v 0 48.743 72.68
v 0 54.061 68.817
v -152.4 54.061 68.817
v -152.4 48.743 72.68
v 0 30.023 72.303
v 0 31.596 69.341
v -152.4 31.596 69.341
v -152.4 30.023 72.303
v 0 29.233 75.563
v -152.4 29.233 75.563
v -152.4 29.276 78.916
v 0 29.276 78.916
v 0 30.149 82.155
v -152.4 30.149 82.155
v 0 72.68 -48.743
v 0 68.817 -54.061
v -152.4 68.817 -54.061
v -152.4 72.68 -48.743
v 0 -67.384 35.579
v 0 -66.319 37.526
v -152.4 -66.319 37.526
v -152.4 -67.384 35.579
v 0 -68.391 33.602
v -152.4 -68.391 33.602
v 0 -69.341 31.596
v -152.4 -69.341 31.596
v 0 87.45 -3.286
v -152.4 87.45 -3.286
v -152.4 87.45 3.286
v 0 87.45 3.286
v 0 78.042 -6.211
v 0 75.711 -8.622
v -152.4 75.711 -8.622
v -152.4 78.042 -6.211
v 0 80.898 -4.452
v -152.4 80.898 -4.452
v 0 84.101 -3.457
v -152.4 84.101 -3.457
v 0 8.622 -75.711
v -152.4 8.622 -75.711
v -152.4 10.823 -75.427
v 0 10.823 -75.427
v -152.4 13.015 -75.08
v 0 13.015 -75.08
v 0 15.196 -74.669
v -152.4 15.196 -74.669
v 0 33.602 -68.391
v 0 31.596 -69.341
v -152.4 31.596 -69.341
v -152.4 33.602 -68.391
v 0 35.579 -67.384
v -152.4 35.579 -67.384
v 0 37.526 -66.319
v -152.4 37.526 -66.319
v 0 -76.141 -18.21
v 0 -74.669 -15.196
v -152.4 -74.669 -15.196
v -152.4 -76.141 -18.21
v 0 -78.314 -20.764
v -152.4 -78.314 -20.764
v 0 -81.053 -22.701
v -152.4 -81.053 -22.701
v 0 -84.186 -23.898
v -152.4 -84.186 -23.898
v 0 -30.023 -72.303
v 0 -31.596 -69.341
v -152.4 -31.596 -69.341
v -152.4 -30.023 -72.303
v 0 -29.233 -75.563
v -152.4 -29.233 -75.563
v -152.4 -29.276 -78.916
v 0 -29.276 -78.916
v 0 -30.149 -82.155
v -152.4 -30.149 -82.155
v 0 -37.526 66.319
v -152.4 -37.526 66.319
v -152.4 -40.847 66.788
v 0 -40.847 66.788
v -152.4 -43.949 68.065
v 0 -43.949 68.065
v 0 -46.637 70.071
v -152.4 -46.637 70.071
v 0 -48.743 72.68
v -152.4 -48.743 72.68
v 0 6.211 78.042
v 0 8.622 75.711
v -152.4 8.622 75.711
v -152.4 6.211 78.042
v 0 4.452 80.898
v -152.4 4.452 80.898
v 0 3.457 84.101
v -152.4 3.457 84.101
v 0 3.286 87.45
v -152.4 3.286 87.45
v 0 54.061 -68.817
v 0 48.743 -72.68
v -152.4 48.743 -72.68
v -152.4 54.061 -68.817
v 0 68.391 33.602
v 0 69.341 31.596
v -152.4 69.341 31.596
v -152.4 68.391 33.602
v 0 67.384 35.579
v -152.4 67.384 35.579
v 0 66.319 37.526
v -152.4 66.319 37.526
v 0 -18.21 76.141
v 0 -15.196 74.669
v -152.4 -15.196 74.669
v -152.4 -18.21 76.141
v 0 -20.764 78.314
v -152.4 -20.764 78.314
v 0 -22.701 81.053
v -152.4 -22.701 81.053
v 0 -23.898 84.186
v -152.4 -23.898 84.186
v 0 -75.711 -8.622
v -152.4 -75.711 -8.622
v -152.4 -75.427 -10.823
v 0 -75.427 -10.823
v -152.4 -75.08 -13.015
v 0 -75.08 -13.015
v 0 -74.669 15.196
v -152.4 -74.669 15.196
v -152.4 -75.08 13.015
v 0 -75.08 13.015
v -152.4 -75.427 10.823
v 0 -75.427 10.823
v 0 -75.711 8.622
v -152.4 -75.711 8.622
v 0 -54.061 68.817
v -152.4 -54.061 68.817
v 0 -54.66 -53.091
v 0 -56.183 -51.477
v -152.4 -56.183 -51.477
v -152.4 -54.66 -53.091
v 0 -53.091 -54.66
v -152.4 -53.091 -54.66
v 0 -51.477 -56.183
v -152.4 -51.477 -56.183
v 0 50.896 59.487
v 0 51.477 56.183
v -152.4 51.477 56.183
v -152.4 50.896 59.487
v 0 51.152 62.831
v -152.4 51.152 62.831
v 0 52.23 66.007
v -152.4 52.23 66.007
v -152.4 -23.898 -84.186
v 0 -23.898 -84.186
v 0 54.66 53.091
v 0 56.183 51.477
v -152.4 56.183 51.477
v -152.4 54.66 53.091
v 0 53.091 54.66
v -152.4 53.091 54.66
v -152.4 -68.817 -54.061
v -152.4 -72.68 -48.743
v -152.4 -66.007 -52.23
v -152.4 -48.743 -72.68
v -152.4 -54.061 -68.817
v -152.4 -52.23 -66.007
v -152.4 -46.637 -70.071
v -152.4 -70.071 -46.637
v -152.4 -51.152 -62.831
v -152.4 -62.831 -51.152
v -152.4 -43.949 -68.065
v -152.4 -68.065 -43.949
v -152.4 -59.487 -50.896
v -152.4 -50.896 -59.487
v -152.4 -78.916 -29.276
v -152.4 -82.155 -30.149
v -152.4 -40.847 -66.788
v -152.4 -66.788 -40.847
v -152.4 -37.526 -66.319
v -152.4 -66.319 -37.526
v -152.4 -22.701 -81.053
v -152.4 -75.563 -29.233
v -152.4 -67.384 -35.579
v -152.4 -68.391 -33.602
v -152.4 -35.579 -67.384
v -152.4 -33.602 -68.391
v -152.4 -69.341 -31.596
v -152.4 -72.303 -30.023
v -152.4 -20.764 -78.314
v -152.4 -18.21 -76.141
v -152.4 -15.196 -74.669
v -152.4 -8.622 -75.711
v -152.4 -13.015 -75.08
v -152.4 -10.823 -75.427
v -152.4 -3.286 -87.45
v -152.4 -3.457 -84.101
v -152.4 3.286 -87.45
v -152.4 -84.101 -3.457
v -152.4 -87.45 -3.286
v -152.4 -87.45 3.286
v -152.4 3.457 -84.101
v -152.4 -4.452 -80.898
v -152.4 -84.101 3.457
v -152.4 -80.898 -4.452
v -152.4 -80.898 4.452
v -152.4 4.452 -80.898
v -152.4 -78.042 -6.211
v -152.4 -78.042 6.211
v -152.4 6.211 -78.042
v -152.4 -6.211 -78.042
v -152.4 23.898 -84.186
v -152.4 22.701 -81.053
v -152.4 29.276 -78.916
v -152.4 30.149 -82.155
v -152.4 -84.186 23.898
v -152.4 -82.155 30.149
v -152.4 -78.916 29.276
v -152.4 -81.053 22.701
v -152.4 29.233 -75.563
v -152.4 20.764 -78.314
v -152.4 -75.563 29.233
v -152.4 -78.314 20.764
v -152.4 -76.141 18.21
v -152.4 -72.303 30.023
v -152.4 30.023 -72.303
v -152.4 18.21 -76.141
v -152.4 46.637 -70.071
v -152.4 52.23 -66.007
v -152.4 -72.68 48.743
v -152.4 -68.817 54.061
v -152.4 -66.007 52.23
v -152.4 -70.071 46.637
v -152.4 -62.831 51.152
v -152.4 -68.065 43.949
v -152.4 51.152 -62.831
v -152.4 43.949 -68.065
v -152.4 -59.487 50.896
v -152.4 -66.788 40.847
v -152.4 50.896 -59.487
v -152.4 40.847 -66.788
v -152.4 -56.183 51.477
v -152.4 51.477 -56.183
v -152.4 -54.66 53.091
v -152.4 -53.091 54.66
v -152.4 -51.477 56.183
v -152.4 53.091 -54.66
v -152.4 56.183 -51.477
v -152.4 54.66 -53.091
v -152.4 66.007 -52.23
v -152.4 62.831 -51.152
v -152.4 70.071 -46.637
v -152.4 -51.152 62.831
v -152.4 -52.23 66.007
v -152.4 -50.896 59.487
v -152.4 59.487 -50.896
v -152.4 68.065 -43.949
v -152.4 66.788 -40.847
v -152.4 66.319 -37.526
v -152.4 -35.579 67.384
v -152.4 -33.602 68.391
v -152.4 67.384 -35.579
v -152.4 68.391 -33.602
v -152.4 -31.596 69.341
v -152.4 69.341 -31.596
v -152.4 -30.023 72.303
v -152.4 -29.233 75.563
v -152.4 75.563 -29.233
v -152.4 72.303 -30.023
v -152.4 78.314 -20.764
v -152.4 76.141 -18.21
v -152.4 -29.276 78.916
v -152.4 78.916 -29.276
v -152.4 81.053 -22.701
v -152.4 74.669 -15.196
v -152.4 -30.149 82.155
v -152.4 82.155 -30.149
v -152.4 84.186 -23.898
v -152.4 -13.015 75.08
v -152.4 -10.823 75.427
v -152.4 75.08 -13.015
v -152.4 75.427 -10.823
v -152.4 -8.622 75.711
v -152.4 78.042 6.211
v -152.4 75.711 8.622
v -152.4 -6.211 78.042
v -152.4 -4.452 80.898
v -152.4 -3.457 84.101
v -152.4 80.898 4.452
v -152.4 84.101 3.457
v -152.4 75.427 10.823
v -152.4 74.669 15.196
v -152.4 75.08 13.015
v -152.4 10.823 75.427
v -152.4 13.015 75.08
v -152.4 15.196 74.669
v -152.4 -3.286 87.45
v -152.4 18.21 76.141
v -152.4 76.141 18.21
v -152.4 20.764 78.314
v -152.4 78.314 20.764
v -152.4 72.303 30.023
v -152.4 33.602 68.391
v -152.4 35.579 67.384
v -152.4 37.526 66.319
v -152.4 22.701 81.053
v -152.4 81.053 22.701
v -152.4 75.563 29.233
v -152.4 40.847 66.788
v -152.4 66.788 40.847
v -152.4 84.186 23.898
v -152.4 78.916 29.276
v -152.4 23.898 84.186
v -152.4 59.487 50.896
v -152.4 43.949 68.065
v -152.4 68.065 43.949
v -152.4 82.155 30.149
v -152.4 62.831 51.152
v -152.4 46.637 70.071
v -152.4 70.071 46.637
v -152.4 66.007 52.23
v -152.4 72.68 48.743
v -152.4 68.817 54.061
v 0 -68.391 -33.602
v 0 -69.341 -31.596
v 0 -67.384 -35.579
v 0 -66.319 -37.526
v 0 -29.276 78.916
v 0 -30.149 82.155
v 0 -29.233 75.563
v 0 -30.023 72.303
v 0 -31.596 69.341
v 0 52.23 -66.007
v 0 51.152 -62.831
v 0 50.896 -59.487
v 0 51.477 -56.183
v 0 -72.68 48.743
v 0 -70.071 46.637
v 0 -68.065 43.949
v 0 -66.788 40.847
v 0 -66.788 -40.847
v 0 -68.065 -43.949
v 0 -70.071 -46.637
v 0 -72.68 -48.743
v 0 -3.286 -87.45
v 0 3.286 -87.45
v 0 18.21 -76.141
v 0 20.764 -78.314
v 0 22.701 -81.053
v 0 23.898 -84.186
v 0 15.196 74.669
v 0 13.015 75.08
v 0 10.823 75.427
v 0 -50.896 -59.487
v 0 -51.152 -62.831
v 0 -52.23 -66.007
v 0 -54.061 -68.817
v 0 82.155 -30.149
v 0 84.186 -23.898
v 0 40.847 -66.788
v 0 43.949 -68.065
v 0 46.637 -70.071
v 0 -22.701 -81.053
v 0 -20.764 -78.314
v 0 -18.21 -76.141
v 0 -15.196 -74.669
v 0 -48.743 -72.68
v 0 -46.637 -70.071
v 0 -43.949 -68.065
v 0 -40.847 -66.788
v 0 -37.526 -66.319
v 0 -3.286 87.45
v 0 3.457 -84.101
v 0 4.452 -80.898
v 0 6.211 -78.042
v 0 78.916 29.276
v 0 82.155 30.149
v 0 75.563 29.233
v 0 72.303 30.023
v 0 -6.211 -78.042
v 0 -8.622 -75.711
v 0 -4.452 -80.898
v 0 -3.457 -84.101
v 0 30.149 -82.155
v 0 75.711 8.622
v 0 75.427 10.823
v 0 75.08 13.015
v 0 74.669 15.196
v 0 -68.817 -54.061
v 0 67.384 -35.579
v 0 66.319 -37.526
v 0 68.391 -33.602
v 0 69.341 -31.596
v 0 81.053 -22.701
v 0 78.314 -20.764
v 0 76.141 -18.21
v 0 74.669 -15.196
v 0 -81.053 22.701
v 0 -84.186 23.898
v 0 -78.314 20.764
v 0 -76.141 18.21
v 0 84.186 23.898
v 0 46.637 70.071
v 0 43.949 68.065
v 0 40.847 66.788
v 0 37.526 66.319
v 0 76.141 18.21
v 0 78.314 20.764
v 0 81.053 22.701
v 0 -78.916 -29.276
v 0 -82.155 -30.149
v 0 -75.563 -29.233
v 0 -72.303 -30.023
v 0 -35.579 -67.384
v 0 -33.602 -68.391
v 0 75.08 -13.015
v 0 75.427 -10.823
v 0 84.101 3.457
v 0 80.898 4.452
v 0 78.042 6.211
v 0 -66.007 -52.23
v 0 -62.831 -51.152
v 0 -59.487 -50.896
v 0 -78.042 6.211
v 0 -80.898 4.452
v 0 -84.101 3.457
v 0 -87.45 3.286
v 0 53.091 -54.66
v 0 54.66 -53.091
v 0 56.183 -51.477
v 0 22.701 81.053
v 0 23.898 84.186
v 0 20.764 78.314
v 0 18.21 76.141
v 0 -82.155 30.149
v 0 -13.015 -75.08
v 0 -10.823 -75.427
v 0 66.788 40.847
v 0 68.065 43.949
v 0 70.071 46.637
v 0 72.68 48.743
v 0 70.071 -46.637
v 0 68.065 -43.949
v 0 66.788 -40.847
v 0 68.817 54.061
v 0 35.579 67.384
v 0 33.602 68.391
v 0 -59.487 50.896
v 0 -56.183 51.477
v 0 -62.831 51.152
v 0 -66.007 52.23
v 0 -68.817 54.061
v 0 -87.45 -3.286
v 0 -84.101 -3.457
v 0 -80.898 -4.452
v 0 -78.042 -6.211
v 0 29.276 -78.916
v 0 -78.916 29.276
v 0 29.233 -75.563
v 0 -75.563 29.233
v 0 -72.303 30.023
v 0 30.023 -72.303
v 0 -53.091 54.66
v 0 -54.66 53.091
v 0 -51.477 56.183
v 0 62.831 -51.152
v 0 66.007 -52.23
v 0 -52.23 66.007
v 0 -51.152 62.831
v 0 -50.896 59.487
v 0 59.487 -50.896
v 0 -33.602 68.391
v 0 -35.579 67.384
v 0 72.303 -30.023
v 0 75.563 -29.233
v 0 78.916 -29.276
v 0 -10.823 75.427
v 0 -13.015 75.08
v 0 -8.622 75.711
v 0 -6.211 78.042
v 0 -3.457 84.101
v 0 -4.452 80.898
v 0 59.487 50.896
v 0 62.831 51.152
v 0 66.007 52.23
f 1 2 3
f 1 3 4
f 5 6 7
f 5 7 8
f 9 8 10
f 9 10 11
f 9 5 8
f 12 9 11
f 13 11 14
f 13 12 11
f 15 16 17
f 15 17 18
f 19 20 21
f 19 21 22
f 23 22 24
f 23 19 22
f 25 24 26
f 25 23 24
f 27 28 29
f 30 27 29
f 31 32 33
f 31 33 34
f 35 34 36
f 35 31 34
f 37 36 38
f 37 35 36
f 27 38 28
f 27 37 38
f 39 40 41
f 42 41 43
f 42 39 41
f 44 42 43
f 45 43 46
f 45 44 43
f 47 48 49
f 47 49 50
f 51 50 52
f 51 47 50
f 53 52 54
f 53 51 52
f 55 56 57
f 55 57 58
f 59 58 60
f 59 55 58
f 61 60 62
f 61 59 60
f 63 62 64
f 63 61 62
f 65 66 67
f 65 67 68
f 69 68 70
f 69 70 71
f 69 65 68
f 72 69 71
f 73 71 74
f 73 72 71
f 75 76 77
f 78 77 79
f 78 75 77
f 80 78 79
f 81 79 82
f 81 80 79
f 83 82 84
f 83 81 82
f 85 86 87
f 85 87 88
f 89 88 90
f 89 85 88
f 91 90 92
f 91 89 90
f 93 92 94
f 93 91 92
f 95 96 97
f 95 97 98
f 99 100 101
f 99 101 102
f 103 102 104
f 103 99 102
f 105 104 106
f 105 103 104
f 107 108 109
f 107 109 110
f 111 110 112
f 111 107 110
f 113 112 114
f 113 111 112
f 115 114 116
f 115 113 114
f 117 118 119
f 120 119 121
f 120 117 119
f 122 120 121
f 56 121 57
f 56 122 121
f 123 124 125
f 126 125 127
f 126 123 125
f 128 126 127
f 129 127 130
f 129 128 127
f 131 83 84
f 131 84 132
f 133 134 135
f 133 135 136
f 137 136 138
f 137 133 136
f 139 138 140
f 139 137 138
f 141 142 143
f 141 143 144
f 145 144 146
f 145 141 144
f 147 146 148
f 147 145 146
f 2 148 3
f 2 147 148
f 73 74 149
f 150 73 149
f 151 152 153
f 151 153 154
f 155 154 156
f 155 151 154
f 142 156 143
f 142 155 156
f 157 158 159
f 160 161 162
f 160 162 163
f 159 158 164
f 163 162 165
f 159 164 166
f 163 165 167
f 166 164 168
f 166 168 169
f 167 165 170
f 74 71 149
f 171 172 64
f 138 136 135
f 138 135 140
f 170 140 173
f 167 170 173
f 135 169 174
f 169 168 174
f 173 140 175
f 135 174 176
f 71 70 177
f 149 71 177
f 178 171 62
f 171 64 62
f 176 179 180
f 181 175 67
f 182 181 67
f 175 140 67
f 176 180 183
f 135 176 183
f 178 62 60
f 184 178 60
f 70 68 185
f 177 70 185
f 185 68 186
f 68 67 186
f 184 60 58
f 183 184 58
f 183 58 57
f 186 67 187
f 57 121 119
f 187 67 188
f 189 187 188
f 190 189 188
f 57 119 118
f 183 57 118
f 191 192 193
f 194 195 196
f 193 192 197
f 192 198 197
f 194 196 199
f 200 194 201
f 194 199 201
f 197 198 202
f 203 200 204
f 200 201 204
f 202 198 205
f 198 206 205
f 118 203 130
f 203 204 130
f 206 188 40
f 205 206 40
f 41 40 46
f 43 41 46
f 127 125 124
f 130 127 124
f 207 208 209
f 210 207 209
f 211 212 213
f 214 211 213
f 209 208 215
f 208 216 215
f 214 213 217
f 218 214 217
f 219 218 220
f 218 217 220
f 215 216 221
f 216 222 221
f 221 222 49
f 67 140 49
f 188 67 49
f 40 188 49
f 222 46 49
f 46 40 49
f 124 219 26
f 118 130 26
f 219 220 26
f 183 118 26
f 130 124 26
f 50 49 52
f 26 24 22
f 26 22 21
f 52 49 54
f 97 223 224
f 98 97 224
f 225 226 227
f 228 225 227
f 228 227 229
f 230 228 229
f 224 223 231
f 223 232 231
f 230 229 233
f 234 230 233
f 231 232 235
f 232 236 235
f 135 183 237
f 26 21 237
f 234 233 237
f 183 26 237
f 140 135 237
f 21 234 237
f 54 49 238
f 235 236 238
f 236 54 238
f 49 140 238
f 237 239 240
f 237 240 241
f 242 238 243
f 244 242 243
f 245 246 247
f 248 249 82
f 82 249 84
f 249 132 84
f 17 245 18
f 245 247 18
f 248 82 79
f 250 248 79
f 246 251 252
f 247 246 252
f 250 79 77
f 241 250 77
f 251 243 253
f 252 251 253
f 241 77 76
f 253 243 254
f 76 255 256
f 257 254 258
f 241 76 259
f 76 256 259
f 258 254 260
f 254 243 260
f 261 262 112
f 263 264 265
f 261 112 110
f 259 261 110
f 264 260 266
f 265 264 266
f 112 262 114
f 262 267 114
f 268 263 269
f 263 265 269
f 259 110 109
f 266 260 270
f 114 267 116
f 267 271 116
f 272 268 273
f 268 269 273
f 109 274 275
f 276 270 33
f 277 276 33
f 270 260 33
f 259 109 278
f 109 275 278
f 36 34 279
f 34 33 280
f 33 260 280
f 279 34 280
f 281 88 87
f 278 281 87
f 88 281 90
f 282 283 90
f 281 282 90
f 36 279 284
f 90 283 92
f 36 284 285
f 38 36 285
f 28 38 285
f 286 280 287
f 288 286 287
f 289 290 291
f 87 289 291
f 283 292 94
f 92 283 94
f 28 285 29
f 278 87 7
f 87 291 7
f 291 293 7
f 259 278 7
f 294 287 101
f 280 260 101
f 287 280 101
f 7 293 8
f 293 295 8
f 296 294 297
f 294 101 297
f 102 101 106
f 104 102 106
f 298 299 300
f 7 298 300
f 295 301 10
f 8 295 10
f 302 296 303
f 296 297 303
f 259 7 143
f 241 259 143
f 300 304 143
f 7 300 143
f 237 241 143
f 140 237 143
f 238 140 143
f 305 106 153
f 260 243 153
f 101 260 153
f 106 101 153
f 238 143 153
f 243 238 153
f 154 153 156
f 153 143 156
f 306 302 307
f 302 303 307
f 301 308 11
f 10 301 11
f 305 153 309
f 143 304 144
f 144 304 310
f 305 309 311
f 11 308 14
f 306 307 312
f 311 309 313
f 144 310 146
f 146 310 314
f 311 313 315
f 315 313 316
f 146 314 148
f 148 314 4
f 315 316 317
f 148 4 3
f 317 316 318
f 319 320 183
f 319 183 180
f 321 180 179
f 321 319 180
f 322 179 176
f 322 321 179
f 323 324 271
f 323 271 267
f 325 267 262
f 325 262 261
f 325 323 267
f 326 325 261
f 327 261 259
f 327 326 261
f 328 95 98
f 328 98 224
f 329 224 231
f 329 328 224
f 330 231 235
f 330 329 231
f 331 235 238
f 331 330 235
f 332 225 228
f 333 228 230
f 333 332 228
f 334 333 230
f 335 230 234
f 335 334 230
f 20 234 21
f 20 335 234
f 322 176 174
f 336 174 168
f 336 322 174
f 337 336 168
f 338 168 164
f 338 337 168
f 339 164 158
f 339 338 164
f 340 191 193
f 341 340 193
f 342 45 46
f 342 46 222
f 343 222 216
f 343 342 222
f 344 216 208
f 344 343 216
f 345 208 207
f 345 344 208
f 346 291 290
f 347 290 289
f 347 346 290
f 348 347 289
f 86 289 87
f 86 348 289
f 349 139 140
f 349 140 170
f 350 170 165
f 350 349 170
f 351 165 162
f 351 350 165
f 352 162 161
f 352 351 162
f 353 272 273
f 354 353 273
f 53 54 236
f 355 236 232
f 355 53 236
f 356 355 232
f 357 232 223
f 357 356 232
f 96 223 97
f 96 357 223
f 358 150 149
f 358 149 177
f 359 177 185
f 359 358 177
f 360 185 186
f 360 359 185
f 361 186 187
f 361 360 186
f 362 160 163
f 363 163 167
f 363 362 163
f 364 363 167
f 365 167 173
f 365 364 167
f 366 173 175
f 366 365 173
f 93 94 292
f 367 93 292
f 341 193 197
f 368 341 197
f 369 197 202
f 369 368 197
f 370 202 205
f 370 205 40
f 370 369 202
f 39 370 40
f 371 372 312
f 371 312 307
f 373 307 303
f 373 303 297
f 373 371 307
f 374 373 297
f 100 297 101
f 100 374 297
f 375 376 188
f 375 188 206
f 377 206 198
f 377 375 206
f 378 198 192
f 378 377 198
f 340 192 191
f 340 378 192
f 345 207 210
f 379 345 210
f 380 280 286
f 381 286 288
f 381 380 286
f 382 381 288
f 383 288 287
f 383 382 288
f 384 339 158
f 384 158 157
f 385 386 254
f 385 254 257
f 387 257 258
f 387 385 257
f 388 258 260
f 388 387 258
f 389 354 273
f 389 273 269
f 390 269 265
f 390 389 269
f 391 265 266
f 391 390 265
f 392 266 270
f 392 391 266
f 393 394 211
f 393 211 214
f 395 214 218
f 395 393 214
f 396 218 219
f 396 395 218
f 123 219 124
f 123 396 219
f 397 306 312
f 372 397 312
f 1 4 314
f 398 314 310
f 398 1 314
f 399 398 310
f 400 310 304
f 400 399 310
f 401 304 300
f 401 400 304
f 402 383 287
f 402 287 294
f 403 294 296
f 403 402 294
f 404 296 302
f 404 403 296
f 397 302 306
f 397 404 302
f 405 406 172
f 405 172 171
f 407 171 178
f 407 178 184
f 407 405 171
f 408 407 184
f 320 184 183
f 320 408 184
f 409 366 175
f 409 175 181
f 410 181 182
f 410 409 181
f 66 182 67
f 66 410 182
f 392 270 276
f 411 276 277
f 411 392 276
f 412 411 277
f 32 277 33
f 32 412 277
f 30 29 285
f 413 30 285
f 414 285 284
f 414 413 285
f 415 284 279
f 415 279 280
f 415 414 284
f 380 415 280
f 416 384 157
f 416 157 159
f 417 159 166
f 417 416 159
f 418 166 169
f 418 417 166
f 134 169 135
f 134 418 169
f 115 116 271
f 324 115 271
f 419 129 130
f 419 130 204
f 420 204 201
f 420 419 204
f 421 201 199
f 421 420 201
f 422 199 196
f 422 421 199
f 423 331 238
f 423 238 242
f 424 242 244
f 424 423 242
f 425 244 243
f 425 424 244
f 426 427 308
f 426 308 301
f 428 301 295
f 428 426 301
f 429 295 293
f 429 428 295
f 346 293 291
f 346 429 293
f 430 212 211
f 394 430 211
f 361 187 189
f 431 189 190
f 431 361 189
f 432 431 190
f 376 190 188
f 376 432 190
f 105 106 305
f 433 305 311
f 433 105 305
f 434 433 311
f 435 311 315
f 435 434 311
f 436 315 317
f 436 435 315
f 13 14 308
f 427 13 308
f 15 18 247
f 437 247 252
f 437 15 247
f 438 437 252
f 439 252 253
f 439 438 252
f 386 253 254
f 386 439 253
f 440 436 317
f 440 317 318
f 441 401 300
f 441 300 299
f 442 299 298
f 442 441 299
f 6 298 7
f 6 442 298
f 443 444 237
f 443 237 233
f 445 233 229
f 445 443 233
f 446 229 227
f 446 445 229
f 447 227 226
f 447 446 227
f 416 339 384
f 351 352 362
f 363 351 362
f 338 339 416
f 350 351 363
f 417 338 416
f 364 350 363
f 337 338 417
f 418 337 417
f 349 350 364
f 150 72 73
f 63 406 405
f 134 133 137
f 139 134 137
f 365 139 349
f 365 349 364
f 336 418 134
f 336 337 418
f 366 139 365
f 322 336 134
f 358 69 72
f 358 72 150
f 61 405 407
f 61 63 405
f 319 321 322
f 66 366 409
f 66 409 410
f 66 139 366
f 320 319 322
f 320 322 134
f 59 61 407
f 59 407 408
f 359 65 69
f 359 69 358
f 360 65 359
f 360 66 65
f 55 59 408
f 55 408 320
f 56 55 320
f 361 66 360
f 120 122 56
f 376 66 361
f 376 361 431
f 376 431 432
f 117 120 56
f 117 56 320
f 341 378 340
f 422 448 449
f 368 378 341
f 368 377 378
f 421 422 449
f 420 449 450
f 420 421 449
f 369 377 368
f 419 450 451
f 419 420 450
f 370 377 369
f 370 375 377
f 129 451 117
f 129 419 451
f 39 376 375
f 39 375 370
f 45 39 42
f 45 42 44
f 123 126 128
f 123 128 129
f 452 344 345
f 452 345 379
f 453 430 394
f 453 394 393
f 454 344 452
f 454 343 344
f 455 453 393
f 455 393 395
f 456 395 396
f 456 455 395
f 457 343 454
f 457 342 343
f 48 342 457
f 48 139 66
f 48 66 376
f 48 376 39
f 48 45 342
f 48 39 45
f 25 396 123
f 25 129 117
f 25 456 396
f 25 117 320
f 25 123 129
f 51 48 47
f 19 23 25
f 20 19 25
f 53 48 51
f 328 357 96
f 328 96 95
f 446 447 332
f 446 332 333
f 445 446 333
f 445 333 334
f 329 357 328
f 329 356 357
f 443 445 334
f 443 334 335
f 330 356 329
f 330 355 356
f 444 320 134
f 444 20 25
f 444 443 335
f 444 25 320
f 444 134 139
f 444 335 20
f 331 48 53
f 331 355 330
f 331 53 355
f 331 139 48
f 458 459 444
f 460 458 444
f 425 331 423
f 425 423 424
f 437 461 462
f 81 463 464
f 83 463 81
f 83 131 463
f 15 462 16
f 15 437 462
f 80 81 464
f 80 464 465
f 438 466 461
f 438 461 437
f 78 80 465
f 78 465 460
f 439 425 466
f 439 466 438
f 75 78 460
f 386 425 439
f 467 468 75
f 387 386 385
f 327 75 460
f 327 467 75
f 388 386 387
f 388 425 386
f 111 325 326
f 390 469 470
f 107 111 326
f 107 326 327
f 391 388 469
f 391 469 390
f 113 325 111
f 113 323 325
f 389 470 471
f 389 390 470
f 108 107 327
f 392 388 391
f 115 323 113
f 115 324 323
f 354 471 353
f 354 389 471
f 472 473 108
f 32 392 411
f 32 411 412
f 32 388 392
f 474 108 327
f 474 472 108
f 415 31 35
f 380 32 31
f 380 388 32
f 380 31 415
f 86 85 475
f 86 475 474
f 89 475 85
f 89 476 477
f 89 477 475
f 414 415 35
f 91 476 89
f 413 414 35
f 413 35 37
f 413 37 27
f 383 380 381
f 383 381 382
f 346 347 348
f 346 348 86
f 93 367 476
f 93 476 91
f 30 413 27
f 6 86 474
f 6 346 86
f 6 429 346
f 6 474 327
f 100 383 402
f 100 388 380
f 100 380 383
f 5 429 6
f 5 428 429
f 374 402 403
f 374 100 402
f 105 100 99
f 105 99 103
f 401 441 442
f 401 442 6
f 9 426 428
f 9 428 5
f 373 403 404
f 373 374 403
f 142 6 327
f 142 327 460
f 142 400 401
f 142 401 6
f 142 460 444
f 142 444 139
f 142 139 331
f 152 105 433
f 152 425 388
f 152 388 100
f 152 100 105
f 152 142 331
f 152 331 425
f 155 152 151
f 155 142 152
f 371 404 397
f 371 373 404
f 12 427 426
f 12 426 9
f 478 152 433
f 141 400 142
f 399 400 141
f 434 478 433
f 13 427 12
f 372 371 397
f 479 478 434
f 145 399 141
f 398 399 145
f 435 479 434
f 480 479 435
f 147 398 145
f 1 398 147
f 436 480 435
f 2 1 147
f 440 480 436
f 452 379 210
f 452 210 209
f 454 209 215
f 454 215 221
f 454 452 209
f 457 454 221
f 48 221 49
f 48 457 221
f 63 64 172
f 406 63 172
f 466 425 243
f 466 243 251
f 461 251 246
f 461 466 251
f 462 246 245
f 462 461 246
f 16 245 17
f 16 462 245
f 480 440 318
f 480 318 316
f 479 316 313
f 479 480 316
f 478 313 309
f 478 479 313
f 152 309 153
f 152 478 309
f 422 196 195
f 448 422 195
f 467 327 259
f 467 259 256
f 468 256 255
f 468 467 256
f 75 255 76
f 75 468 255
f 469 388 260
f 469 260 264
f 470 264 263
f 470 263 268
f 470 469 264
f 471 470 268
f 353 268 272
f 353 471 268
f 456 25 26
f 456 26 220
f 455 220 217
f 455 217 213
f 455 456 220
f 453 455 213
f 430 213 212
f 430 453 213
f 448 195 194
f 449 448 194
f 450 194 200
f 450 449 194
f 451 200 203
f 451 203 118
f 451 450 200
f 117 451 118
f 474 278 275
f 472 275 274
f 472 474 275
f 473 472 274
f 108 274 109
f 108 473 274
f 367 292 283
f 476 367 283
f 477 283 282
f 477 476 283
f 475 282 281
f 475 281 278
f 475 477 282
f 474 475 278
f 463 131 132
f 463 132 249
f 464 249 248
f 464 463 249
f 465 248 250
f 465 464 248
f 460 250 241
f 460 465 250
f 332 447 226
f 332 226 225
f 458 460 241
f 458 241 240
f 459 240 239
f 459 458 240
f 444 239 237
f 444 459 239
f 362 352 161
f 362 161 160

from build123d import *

# Parameters (mm, degrees)
F0_DEPTH = 152.4


with BuildPart() as f0:
    # F1 (on Right) → F0 (new body)
    with BuildSketch(Plane.YZ):
        with BuildLine():
            ThreePointArc((75.710623, -8.622155), (76.077557, -4.318016), (76.2, 0))
            ThreePointArc((76.2, 0), (76.077557, 4.318016), (75.710623, 8.622155))
            ThreePointArc((75.710623, 8.622155), (75.261852, 11.920306), (74.669474, 15.195713))
            ThreePointArc((74.669474, 15.195713), (72.470507, 23.547095), (69.340689, 31.596025))
            ThreePointArc((69.340689, 31.596025), (67.894697, 34.594076), (66.319156, 37.526118))
            ThreePointArc((66.319156, 37.526118), (61.647095, 44.789236), (56.183205, 51.477057))
            ThreePointArc((56.183205, 51.477057), (53.881537, 53.881537), (51.477057, 56.183205))
            ThreePointArc((51.477057, 56.183205), (44.789236, 61.647095), (37.526118, 66.319156))
            ThreePointArc((37.526118, 66.319156), (34.594076, 67.894697), (31.596025, 69.340689))
            ThreePointArc((31.596025, 69.340689), (23.547095, 72.470507), (15.195713, 74.669474))
            ThreePointArc((15.195713, 74.669474), (11.920306, 75.261852), (8.622155, 75.710623))
            ThreePointArc((8.622155, 75.710623), (0, 76.2), (-8.622155, 75.710623))
            ThreePointArc((-8.622155, 75.710623), (-11.920306, 75.261852), (-15.195713, 74.669474))
            ThreePointArc((-15.195713, 74.669474), (-23.547095, 72.470507), (-31.596025, 69.340689))
            ThreePointArc((-31.596025, 69.340689), (-34.594076, 67.894697), (-37.526118, 66.319156))
            ThreePointArc((-37.526118, 66.319156), (-44.789236, 61.647095), (-51.477057, 56.183205))
            ThreePointArc((-51.477057, 56.183205), (-53.881537, 53.881537), (-56.183205, 51.477057))
            ThreePointArc((-56.183205, 51.477057), (-61.647095, 44.789236), (-66.319156, 37.526118))
            ThreePointArc((-66.319156, 37.526118), (-67.894697, 34.594076), (-69.340689, 31.596025))
            ThreePointArc((-69.340689, 31.596025), (-72.470507, 23.547095), (-74.669474, 15.195713))
            ThreePointArc((-74.669474, 15.195713), (-75.261852, 11.920306), (-75.710623, 8.622155))
            ThreePointArc((-75.710623, 8.622155), (-76.2, 0), (-75.710623, -8.622155))
            ThreePointArc((-75.710623, -8.622155), (-75.261852, -11.920306), (-74.669474, -15.195713))
            ThreePointArc((-74.669474, -15.195713), (-72.470507, -23.547095), (-69.340689, -31.596025))
            ThreePointArc((-69.340689, -31.596025), (-67.894697, -34.594076), (-66.319156, -37.526118))
            ThreePointArc((-66.319156, -37.526118), (-61.647095, -44.789236), (-56.183205, -51.477057))
            ThreePointArc((-56.183205, -51.477057), (-53.881537, -53.881537), (-51.477057, -56.183205))
            ThreePointArc((-51.477057, -56.183205), (-44.789236, -61.647095), (-37.526118, -66.319156))
            ThreePointArc((-37.526118, -66.319156), (-34.594076, -67.894697), (-31.596025, -69.340689))
            ThreePointArc((-31.596025, -69.340689), (-23.547095, -72.470507), (-15.195713, -74.669474))
            ThreePointArc((-15.195713, -74.669474), (-11.920306, -75.261852), (-8.622155, -75.710623))
            ThreePointArc((-8.622155, -75.710623), (0, -76.2), (8.622155, -75.710623))
            ThreePointArc((8.622155, -75.710623), (11.920306, -75.261852), (15.195713, -74.669474))
            ThreePointArc((15.195713, -74.669474), (23.547095, -72.470507), (31.596025, -69.340689))
            ThreePointArc((31.596025, -69.340689), (34.594076, -67.894697), (37.526118, -66.319156))
            ThreePointArc((37.526118, -66.319156), (44.789236, -61.647095), (51.477057, -56.183205))
            ThreePointArc((51.477057, -56.183205), (53.881537, -53.881537), (56.183205, -51.477057))
            ThreePointArc((56.183205, -51.477057), (61.647095, -44.789236), (66.319156, -37.526118))
            ThreePointArc((66.319156, -37.526118), (67.894697, -34.594076), (69.340689, -31.596025))
            ThreePointArc((69.340689, -31.596025), (72.470507, -23.547095), (74.669474, -15.195713))
            ThreePointArc((74.669474, -15.195713), (75.261852, -11.920306), (75.710623, -8.622155))
        make_face()
        with BuildLine():
            ThreePointArc((-31.596025, 69.340689), (-23.547095, 72.470507), (-15.195713, 74.669474))
            ThreePointArc((-15.195713, 74.669474), (-20.764473, 78.314179), (-23.898246, 84.185671))
            Line((-23.898246, 84.185671), (-30.149009, 82.154676))
            ThreePointArc((-30.149009, 82.154676), (-29.233108, 75.562553), (-31.596025, 69.340689))
        make_face()
        with BuildLine():
            ThreePointArc((-51.477057, 56.183205), (-44.789236, 61.647095), (-37.526118, 66.319156))
            ThreePointArc((-37.526118, 66.319156), (-43.948599, 68.064635), (-48.743386, 72.680367))
            Line((-48.743386, 72.680367), (-54.060602, 68.817184))
            ThreePointArc((-54.060602, 68.817184), (-51.152451, 62.830731), (-51.477057, 56.183205))
        make_face()
        with BuildLine():
            ThreePointArc((-66.319156, 37.526118), (-61.647095, 44.789236), (-56.183205, 51.477057))
            ThreePointArc((-56.183205, 51.477057), (-62.830731, 51.152451), (-68.817184, 54.060602))
            Line((-68.817184, 54.060602), (-72.680367, 48.743386))
            ThreePointArc((-72.680367, 48.743386), (-68.064635, 43.948599), (-66.319156, 37.526118))
        make_face()
        with BuildLine():
            ThreePointArc((-74.669474, 15.195713), (-72.470507, 23.547095), (-69.340689, 31.596025))
            ThreePointArc((-69.340689, 31.596025), (-75.562553, 29.233108), (-82.154676, 30.149009))
            Line((-82.154676, 30.149009), (-84.185671, 23.898246))
            ThreePointArc((-84.185671, 23.898246), (-78.314179, 20.764473), (-74.669474, 15.195713))
        make_face()
        with BuildLine():
            ThreePointArc((-75.710623, -8.622155), (-76.2, 0), (-75.710623, 8.622155))
            ThreePointArc((-75.710623, 8.622155), (-80.897785, 4.452225), (-87.450296, 3.28622))
            Line((-87.450296, 3.28622), (-87.450296, -3.28622))
            ThreePointArc((-87.450296, -3.28622), (-80.897785, -4.452225), (-75.710623, -8.622155))
        make_face()
        with BuildLine():
            ThreePointArc((-82.154676, -30.149009), (-75.562553, -29.233108), (-69.340689, -31.596025))
            ThreePointArc((-69.340689, -31.596025), (-72.470507, -23.547095), (-74.669474, -15.195713))
            ThreePointArc((-74.669474, -15.195713), (-78.314179, -20.764473), (-84.185671, -23.898246))
            Line((-84.185671, -23.898246), (-82.154676, -30.149009))
        make_face()
        with BuildLine():
            ThreePointArc((-68.817184, -54.060602), (-62.830731, -51.152451), (-56.183205, -51.477057))
            ThreePointArc((-56.183205, -51.477057), (-61.647095, -44.789236), (-66.319156, -37.526118))
            ThreePointArc((-66.319156, -37.526118), (-68.064635, -43.948599), (-72.680367, -48.743386))
            Line((-72.680367, -48.743386), (-68.817184, -54.060602))
        make_face()
        with BuildLine():
            ThreePointArc((-48.743386, -72.680367), (-43.948599, -68.064635), (-37.526118, -66.319156))
            ThreePointArc((-37.526118, -66.319156), (-44.789236, -61.647095), (-51.477057, -56.183205))
            ThreePointArc((-51.477057, -56.183205), (-51.152451, -62.830731), (-54.060602, -68.817184))
            Line((-54.060602, -68.817184), (-48.743386, -72.680367))
        make_face()
        with BuildLine():
            ThreePointArc((-23.898246, -84.185671), (-20.764473, -78.314179), (-15.195713, -74.669474))
            ThreePointArc((-15.195713, -74.669474), (-23.547095, -72.470507), (-31.596025, -69.340689))
            ThreePointArc((-31.596025, -69.340689), (-29.233108, -75.562553), (-30.149009, -82.154676))
            Line((-30.149009, -82.154676), (-23.898246, -84.185671))
        make_face()
        with BuildLine():
            ThreePointArc((3.28622, -87.450296), (4.452225, -80.897785), (8.622155, -75.710623))
            ThreePointArc((8.622155, -75.710623), (0, -76.2), (-8.622155, -75.710623))
            ThreePointArc((-8.622155, -75.710623), (-4.452225, -80.897785), (-3.28622, -87.450296))
            Line((-3.28622, -87.450296), (3.28622, -87.450296))
        make_face()
        with BuildLine():
            ThreePointArc((30.149009, -82.154676), (29.233108, -75.562553), (31.596025, -69.340689))
            ThreePointArc((31.596025, -69.340689), (23.547095, -72.470507), (15.195713, -74.669474))
            ThreePointArc((15.195713, -74.669474), (20.764473, -78.314179), (23.898246, -84.185671))
            Line((23.898246, -84.185671), (30.149009, -82.154676))
        make_face()
        with BuildLine():
            ThreePointArc((54.060602, -68.817184), (51.152451, -62.830731), (51.477057, -56.183205))
            ThreePointArc((51.477057, -56.183205), (44.789236, -61.647095), (37.526118, -66.319156))
            ThreePointArc((37.526118, -66.319156), (43.948599, -68.064635), (48.743386, -72.680367))
            Line((48.743386, -72.680367), (54.060602, -68.817184))
        make_face()
        with BuildLine():
            ThreePointArc((72.680367, -48.743386), (68.064635, -43.948599), (66.319156, -37.526118))
            ThreePointArc((66.319156, -37.526118), (61.647095, -44.789236), (56.183205, -51.477057))
            ThreePointArc((56.183205, -51.477057), (62.830731, -51.152451), (68.817184, -54.060602))
            Line((68.817184, -54.060602), (72.680367, -48.743386))
        make_face()
        with BuildLine():
            ThreePointArc((84.185671, -23.898246), (78.314179, -20.764473), (74.669474, -15.195713))
            ThreePointArc((74.669474, -15.195713), (72.470507, -23.547095), (69.340689, -31.596025))
            ThreePointArc((69.340689, -31.596025), (75.562553, -29.233108), (82.154676, -30.149009))
            Line((82.154676, -30.149009), (84.185671, -23.898246))
        make_face()
        with BuildLine():
            ThreePointArc((75.710623, 8.622155), (76.077557, 4.318016), (76.2, 0))
            ThreePointArc((76.2, 0), (76.077557, -4.318016), (75.710623, -8.622155))
            ThreePointArc((75.710623, -8.622155), (80.897785, -4.452225), (87.450296, -3.28622))
            Line((87.450296, -3.28622), (87.450296, 3.28622))
            ThreePointArc((87.450296, 3.28622), (80.897785, 4.452225), (75.710623, 8.622155))
        make_face()
        with BuildLine():
            ThreePointArc((69.340689, 31.596025), (72.470507, 23.547095), (74.669474, 15.195713))
            ThreePointArc((74.669474, 15.195713), (78.314179, 20.764473), (84.185671, 23.898246))
            Line((84.185671, 23.898246), (82.154676, 30.149009))
            ThreePointArc((82.154676, 30.149009), (75.562553, 29.233108), (69.340689, 31.596025))
        make_face()
        with BuildLine():
            ThreePointArc((56.183205, 51.477057), (61.647095, 44.789236), (66.319156, 37.526118))
            ThreePointArc((66.319156, 37.526118), (68.064635, 43.948599), (72.680367, 48.743386))
            Line((72.680367, 48.743386), (68.817184, 54.060602))
            ThreePointArc((68.817184, 54.060602), (62.830731, 51.152451), (56.183205, 51.477057))
        make_face()
        with BuildLine():
            ThreePointArc((37.526118, 66.319156), (44.789236, 61.647095), (51.477057, 56.183205))
            ThreePointArc((51.477057, 56.183205), (51.152451, 62.830731), (54.060602, 68.817184))
            Line((54.060602, 68.817184), (48.743386, 72.680367))
            ThreePointArc((48.743386, 72.680367), (43.948599, 68.064635), (37.526118, 66.319156))
        make_face()
        with BuildLine():
            ThreePointArc((15.195713, 74.669474), (23.547095, 72.470507), (31.596025, 69.340689))
            ThreePointArc((31.596025, 69.340689), (29.233108, 75.562553), (30.149009, 82.154676))
            Line((30.149009, 82.154676), (23.898246, 84.185671))
            ThreePointArc((23.898246, 84.185671), (20.764473, 78.314179), (15.195713, 74.669474))
        make_face()
        with BuildLine():
            ThreePointArc((-8.622155, 75.710623), (0, 76.2), (8.622155, 75.710623))
            ThreePointArc((8.622155, 75.710623), (4.452225, 80.897785), (3.28622, 87.450296))
            Line((3.28622, 87.450296), (-3.28622, 87.450296))
            ThreePointArc((-3.28622, 87.450296), (-4.452225, 80.897785), (-8.622155, 75.710623))
        make_face()
    extrude(amount=-F0_DEPTH)


solid = f0.part
